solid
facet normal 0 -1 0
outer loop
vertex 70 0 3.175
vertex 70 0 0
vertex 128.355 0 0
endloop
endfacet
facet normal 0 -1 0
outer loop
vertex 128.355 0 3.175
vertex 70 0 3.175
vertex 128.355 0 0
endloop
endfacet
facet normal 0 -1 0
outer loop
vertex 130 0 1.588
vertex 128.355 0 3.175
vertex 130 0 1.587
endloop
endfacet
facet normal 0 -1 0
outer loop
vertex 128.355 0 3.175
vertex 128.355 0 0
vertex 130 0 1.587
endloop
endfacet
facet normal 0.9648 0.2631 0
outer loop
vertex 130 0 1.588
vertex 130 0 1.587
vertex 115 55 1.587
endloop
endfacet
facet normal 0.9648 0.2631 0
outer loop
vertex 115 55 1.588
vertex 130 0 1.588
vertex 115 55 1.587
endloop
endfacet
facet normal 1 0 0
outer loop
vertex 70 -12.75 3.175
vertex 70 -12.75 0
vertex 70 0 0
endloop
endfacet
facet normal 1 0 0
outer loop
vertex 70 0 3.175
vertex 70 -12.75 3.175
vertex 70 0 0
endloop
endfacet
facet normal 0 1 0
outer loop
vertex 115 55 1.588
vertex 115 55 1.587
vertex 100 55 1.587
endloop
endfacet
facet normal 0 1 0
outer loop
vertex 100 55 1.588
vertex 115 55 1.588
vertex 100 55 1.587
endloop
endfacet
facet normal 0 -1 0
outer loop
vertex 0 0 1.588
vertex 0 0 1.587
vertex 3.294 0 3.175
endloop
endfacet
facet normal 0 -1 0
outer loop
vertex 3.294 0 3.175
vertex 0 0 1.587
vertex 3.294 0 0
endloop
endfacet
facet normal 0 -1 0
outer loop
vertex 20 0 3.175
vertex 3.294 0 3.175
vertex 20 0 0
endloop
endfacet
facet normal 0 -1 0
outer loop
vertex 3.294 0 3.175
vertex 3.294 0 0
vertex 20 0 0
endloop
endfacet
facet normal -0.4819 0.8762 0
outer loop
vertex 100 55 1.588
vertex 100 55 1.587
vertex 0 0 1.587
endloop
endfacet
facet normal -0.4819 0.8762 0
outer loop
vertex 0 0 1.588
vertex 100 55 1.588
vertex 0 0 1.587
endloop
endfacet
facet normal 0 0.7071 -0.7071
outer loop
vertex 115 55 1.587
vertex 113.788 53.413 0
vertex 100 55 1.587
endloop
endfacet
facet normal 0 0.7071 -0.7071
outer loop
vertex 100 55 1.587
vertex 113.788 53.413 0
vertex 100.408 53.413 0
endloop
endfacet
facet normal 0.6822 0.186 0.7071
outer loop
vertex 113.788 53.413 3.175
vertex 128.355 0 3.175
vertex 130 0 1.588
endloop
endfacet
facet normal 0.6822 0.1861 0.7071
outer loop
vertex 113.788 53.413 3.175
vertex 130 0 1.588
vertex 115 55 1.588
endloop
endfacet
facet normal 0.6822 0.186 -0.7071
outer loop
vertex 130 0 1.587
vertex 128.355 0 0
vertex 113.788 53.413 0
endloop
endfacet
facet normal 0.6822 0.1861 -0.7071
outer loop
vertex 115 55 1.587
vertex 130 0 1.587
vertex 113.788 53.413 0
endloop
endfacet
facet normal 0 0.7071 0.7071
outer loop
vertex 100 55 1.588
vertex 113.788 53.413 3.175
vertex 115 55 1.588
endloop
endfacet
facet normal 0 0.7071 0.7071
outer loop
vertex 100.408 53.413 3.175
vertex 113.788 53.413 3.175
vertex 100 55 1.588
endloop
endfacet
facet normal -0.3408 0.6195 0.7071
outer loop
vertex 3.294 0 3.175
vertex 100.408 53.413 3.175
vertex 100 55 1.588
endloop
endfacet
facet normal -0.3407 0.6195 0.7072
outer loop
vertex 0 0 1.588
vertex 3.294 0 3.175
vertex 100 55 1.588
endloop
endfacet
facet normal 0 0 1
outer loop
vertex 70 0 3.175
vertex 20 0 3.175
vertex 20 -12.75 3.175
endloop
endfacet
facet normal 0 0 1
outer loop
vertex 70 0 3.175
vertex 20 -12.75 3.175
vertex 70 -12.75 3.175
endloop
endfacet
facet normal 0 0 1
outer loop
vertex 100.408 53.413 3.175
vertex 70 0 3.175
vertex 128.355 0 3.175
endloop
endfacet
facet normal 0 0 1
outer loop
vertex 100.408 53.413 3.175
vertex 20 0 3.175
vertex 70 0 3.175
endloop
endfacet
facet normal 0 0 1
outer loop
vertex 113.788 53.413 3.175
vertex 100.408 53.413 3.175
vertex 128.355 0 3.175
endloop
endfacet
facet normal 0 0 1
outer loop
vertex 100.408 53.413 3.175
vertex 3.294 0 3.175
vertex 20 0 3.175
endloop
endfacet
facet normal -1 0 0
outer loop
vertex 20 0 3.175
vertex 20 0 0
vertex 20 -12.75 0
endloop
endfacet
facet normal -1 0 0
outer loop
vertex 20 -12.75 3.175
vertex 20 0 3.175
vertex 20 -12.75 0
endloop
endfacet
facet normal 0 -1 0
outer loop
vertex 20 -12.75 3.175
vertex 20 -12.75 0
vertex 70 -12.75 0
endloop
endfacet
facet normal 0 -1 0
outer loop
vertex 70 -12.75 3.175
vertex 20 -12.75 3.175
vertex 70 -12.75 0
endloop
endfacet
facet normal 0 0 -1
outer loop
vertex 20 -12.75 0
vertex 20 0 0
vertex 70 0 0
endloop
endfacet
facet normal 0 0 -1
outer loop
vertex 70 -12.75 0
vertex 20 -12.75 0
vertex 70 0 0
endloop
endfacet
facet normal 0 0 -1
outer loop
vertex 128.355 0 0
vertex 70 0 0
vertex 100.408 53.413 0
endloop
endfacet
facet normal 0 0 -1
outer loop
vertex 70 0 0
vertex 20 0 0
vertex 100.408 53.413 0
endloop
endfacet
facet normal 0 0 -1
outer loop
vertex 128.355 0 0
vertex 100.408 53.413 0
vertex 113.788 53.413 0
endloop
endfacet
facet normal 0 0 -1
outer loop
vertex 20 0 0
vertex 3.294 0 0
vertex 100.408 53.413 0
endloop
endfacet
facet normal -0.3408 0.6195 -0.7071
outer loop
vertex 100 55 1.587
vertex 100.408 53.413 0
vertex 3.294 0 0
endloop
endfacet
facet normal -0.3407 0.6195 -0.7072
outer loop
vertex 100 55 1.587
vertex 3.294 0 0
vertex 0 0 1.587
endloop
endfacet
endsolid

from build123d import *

# Parameters (mm, degrees)
BOSS_EXTRUDE1_DEPTH = 3.175
CHAMFER1_SIZE       = 1.5875


with BuildPart() as part:
    # Sketch1 → Boss-Extrude1 (new body)
    with BuildSketch(Plane.XY):
        Polygon((0, 0), (20, 0), (20, -12.75), (70, -12.75), (70, 0), (130, 0), (115, 55), (100, 55), align=None)
    extrude(amount=BOSS_EXTRUDE1_DEPTH)

    # Chamfer1
    chamfer1_edges = [part.edges().sort_by_distance(p)[0] for p in [
        (50, 27.5, 3.175),
        (107.5, 55, 3.175),
        (122.5, 27.5, 3.175),
        (50, 27.5, 0),
        (107.5, 55, 0),
        (122.5, 27.5, 0),
    ]]
    chamfer(chamfer1_edges, length=CHAMFER1_SIZE - 0.0001)  # a hair under: the kernel refuses the full size


solid = part.part
